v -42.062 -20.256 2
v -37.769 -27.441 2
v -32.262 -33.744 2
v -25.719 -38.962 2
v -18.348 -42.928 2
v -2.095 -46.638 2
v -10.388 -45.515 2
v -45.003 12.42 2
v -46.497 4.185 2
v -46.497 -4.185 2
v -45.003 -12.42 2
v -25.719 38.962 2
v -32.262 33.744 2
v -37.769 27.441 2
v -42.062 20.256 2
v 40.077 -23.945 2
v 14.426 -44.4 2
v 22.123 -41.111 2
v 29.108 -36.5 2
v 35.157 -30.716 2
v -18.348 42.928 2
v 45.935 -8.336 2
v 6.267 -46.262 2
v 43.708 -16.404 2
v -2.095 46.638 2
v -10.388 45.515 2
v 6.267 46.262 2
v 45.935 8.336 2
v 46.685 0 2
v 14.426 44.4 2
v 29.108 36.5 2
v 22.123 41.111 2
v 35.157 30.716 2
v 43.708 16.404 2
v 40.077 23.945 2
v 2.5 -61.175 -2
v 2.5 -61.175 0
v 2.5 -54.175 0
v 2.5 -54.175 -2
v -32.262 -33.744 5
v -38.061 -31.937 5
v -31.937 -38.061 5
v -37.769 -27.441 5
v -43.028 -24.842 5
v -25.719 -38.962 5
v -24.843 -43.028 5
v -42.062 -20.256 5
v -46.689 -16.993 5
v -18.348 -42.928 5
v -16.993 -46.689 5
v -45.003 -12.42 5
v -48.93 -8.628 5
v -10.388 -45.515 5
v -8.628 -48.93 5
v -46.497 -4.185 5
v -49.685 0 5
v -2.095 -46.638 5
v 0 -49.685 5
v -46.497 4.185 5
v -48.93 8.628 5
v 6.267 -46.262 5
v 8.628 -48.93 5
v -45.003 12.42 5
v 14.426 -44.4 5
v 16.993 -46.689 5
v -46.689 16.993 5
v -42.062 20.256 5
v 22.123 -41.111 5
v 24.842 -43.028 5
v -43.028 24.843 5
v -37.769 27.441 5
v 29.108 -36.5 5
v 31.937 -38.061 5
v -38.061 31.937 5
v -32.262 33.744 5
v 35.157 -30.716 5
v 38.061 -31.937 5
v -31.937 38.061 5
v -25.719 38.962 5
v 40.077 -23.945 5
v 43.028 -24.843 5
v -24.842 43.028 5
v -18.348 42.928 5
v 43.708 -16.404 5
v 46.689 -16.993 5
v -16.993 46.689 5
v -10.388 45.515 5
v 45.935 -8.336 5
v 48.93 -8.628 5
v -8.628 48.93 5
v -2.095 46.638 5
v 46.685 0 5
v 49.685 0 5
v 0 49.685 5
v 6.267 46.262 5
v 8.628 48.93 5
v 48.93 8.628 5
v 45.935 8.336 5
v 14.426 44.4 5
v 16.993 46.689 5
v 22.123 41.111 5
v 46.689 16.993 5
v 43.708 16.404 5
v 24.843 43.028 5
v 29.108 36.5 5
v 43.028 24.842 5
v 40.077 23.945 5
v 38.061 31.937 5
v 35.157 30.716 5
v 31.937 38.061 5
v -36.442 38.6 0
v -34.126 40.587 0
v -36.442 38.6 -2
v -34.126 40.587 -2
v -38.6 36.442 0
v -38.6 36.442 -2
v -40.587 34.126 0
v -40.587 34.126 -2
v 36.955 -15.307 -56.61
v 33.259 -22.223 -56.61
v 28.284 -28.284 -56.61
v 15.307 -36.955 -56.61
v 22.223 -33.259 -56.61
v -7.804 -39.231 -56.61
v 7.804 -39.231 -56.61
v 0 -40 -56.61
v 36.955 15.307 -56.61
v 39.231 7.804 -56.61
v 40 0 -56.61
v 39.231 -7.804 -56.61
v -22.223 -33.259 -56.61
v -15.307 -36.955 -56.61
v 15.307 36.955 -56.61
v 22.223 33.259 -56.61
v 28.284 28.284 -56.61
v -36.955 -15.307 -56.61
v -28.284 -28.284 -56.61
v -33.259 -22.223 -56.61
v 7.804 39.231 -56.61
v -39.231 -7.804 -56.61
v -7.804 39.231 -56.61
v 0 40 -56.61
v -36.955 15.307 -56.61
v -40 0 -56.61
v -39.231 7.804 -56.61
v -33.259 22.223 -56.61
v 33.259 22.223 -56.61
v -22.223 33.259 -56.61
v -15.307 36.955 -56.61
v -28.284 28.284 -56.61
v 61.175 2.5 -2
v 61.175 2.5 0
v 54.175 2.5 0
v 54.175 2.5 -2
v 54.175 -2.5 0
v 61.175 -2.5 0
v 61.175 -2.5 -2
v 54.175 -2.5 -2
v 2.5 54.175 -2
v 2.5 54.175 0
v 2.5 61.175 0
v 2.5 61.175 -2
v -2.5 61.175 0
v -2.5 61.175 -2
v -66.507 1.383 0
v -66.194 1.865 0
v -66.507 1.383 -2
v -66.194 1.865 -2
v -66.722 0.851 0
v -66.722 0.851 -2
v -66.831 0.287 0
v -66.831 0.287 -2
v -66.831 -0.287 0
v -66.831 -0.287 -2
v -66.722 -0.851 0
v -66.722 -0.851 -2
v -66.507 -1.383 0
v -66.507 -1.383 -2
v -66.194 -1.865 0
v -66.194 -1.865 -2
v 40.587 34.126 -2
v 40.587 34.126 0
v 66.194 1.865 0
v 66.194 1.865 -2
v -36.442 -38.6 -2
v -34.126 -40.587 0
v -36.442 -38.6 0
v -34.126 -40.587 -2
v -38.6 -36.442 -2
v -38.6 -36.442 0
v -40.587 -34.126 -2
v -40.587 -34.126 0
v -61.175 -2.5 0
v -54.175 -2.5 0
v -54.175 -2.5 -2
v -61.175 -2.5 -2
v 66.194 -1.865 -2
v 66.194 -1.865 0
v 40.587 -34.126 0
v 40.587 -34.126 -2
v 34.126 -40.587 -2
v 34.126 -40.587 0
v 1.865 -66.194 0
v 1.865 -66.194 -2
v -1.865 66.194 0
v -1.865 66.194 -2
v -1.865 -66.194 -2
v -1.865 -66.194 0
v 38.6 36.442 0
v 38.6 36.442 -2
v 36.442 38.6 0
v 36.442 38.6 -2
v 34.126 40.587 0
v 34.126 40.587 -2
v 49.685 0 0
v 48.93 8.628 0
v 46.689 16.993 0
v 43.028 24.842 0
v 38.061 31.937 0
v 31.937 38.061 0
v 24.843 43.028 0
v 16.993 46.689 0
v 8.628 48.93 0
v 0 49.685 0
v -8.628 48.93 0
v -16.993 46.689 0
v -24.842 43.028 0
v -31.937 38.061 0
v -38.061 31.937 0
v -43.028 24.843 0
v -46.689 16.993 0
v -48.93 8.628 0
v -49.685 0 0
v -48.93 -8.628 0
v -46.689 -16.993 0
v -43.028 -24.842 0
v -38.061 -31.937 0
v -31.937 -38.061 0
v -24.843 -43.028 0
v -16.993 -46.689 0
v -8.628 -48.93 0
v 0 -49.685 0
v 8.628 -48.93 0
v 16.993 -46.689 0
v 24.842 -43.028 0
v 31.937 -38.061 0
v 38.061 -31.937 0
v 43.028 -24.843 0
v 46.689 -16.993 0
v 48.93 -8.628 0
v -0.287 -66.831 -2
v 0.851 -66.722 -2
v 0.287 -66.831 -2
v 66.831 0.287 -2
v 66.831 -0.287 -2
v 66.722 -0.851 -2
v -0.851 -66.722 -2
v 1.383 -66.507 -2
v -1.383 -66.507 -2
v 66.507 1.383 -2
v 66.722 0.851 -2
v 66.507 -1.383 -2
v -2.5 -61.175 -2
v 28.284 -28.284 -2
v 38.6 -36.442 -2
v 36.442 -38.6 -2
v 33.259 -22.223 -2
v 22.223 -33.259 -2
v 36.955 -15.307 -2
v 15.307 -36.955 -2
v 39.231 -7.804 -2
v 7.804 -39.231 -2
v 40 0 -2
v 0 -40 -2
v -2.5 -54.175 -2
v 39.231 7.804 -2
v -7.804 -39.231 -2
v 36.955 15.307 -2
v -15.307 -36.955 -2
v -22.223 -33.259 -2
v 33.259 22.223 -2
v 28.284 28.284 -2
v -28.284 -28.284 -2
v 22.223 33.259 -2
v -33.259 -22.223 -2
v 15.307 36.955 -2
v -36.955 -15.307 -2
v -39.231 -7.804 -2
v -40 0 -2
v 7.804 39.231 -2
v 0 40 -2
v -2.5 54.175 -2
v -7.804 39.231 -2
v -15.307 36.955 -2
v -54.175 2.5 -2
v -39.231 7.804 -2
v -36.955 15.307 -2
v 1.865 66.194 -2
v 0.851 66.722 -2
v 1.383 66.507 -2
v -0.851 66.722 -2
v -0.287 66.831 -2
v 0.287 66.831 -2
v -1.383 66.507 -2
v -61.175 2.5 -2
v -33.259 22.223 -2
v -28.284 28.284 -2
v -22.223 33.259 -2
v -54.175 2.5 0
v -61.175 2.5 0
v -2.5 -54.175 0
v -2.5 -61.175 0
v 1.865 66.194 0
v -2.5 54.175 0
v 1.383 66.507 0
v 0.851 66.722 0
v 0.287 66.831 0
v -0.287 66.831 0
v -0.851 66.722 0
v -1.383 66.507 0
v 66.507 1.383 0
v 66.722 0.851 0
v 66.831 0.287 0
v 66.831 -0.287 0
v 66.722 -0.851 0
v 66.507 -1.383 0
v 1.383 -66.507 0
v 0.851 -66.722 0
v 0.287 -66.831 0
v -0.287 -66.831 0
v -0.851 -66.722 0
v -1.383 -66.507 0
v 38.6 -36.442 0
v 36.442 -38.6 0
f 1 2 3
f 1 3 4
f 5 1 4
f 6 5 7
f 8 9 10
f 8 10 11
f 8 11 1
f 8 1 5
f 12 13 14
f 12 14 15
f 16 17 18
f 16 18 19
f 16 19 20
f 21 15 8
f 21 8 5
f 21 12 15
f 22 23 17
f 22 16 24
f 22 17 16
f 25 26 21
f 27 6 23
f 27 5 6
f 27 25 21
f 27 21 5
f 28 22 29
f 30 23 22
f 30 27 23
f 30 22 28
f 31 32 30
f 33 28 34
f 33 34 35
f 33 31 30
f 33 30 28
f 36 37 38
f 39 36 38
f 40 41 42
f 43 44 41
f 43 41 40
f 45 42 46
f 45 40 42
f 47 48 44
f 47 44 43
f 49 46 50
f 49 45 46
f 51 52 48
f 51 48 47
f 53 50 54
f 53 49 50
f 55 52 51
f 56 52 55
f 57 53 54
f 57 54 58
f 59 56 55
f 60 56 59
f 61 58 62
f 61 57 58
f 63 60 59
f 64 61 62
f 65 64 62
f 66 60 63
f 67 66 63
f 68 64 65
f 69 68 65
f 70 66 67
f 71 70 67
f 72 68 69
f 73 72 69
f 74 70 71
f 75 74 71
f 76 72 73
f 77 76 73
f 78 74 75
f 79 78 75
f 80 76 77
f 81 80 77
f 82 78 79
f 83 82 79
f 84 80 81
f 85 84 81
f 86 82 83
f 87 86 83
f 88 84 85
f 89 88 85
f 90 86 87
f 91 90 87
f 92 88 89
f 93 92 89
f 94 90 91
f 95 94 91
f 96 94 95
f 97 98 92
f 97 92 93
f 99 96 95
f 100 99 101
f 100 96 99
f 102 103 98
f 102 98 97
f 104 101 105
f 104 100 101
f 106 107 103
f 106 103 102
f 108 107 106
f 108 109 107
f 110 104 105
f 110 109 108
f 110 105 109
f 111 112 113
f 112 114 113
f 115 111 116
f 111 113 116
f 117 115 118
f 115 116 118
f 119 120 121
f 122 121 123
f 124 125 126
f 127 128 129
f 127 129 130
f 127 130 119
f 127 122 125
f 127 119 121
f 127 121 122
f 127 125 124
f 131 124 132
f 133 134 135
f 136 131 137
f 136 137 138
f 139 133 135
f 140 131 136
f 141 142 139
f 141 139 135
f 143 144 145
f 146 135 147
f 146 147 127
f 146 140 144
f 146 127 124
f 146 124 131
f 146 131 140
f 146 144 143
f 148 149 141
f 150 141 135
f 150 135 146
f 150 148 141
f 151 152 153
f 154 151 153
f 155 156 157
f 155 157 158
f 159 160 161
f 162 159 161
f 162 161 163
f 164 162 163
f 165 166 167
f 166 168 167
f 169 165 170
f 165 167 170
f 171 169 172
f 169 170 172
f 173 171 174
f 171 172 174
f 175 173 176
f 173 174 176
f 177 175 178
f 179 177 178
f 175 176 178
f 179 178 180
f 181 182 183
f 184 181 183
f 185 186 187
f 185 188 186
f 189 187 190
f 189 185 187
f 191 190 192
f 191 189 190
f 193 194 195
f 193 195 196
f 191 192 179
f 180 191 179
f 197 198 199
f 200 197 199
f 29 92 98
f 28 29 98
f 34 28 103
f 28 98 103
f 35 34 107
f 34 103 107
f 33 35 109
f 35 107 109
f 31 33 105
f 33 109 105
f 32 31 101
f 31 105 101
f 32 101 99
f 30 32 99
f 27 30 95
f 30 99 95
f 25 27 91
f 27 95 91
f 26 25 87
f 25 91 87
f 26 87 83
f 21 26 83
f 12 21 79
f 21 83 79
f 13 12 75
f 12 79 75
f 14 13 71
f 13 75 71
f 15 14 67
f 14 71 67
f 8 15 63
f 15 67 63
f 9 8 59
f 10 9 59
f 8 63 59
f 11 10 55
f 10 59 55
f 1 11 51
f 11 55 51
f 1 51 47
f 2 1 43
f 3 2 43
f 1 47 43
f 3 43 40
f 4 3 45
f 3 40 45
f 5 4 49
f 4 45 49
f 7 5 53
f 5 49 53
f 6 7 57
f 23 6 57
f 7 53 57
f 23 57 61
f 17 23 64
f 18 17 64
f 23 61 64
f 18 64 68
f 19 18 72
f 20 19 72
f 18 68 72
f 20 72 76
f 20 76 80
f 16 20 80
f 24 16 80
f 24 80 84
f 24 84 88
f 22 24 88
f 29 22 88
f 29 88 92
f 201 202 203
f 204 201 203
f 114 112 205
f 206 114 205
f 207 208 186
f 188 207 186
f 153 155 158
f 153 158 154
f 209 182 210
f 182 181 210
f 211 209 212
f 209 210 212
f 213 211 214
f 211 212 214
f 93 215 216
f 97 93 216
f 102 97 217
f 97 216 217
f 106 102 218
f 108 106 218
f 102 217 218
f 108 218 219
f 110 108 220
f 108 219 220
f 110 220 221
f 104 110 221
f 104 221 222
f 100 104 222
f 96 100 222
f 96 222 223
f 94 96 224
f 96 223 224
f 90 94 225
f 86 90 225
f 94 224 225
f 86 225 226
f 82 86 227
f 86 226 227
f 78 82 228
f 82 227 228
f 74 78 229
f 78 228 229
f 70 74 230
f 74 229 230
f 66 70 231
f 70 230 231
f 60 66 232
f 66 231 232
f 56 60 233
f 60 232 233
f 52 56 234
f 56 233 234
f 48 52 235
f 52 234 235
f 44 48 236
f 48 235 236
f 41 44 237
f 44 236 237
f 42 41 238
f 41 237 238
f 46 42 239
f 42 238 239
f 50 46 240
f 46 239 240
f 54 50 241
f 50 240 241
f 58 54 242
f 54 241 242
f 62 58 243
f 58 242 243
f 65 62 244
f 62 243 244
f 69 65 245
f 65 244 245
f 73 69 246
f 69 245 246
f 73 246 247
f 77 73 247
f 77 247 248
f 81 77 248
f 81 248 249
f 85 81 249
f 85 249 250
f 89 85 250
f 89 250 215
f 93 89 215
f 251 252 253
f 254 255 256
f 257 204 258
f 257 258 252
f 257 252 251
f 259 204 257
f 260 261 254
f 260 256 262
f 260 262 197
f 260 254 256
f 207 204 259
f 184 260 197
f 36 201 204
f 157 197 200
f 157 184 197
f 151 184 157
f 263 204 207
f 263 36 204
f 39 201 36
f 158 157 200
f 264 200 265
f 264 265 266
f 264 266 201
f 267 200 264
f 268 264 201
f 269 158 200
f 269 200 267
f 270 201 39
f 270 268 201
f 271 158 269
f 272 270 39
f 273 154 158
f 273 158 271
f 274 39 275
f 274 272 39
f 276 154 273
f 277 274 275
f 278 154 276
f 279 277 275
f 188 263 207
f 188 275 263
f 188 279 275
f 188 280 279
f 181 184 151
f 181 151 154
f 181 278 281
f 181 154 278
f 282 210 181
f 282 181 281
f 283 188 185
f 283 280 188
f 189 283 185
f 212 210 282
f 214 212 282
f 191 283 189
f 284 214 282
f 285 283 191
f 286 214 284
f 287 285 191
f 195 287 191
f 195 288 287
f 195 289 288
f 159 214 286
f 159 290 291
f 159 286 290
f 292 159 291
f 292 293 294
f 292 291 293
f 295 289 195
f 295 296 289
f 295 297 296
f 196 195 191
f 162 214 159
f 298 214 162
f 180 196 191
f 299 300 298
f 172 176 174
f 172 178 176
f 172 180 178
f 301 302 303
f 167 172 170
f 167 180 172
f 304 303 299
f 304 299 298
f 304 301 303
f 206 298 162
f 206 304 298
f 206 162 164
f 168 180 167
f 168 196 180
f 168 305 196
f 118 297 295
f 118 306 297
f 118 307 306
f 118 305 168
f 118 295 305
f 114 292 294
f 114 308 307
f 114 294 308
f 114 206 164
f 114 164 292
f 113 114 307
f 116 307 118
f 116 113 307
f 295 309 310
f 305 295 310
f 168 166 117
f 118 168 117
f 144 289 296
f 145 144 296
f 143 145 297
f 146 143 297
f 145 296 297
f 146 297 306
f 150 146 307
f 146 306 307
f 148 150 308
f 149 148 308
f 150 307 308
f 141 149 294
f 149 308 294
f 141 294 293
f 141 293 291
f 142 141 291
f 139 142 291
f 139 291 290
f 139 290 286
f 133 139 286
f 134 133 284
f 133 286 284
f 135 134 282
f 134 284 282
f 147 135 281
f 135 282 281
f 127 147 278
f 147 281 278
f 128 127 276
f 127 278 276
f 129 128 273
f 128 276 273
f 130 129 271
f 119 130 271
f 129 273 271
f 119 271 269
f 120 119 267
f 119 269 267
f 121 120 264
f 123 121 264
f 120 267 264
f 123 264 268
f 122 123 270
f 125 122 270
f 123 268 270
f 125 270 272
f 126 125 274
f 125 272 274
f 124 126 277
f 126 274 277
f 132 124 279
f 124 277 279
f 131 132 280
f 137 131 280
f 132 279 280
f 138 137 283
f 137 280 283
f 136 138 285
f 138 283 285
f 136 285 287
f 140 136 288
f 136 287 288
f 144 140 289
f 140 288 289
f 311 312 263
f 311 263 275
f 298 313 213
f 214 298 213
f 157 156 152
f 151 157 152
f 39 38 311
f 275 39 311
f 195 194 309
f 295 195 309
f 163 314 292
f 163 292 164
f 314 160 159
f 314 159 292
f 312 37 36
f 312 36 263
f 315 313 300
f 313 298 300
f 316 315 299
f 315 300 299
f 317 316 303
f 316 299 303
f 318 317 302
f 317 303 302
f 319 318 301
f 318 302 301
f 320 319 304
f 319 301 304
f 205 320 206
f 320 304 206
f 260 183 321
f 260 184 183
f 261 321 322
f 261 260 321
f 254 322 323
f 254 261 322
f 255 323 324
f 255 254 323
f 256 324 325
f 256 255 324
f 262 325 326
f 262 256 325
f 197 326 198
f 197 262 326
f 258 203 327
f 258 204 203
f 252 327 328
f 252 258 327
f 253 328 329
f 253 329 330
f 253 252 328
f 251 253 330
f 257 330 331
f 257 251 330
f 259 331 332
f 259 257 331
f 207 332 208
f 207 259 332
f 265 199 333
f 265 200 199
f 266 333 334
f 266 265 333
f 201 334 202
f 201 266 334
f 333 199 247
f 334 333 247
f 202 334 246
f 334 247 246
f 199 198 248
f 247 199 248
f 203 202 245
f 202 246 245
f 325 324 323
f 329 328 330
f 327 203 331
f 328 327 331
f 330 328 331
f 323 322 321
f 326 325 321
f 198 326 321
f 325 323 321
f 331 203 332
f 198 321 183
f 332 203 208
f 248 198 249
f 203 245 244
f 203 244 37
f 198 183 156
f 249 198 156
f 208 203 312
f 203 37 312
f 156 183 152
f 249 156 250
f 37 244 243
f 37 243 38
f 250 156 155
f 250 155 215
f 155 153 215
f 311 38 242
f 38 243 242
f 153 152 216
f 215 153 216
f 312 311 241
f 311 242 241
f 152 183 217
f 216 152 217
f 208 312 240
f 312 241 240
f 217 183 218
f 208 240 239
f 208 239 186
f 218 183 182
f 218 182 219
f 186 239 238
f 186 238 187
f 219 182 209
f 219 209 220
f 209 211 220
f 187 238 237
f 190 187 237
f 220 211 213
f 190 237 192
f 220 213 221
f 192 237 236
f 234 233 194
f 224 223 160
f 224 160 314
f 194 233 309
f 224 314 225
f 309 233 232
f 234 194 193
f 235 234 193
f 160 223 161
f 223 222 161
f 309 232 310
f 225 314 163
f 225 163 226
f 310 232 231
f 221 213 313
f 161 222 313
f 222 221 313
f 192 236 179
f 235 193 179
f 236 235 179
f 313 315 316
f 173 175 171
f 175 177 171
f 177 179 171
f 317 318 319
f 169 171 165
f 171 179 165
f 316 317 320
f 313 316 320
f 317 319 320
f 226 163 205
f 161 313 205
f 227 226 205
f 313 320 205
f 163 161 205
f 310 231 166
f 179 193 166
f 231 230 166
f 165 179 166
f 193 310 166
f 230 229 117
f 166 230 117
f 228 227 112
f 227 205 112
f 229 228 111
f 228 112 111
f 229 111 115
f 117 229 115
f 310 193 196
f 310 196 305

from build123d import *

# Parameters (mm, degrees)
SKETCH1_R           = 49.685
BOSS_EXTRUDE1_DEPTH = 5
SKETCH2_R           = 46.685
CUT_EXTRUDE1_DEPTH  = 3
SKETCH3_W           = 7
SKETCH3_H           = 5
SKETCH3_W_2         = 5
SKETCH3_H_2         = 7
BOSS_EXTRUDE2_DEPTH = 2
SKETCH4_R           = 40
BOSS_EXTRUDE3_DEPTH = 54.61
FILLET2_R           = 3
FILLET3_R           = 40


with BuildPart() as part:
    # Sketch1 → Boss-Extrude1 (new body)
    with BuildSketch(Plane.XY):
        Circle(SKETCH1_R)
    extrude(amount=BOSS_EXTRUDE1_DEPTH)

    # Sketch2 → Cut-Extrude1 (cut)
    with BuildSketch(Plane.XY.offset(5)):
        Circle(SKETCH2_R)
    extrude(amount=-CUT_EXTRUDE1_DEPTH, mode=Mode.SUBTRACT)

    # Sketch3 → Boss-Extrude2 (add)
    with BuildSketch(Plane(origin=(0, 0, 0), x_dir=(-1, 0, 0), z_dir=(0, 0, -1))):
        Polygon((-37.72768231, 37.72768231), (-67.675, 0), (-37.72768231, -37.72768231), (0, -67.675), (37.72768231, -37.72768231), (67.675, 0), (37.72768231, 37.72768231), (0, 67.675), align=None)
        with Locations((-57.675, 0)):
            Rectangle(SKETCH3_W, SKETCH3_H, mode=Mode.SUBTRACT)
        with Locations((0, 57.675)):
            Rectangle(SKETCH3_W_2, SKETCH3_H_2, mode=Mode.SUBTRACT)
        with Locations((57.675, 0)):
            Rectangle(SKETCH3_W, SKETCH3_H, mode=Mode.SUBTRACT)
        with Locations((0, -57.675)):
            Rectangle(SKETCH3_W_2, SKETCH3_H_2, mode=Mode.SUBTRACT)
    extrude(amount=BOSS_EXTRUDE2_DEPTH)

    # Sketch4 → Boss-Extrude3 (add)
    with BuildSketch(Plane(origin=(0, 0, -2), x_dir=(-1, 0, 0), z_dir=(0, 0, -1))):
        Circle(SKETCH4_R)
    extrude(amount=BOSS_EXTRUDE3_DEPTH)

    # Fillet2
    fillet2_edges = [part.edges().sort_by_distance(p)[0] for p in [
        (-67.675, 0, -1),
        (0, 67.675, -1),
        (67.675, 0, -1),
        (0, -67.675, -1),
    ]]
    fillet(fillet2_edges, radius=FILLET2_R)

    # Fillet3
    fillet3_edges = [part.edges().sort_by_distance(p)[0] for p in [
        (-37.72768231, 37.72768231, -1),
        (37.72768231, 37.72768231, -1),
        (37.72768231, -37.72768231, -1),
        (-37.72768231, -37.72768231, -1),
    ]]
    fillet(fillet3_edges, radius=FILLET3_R)


solid = part.part
